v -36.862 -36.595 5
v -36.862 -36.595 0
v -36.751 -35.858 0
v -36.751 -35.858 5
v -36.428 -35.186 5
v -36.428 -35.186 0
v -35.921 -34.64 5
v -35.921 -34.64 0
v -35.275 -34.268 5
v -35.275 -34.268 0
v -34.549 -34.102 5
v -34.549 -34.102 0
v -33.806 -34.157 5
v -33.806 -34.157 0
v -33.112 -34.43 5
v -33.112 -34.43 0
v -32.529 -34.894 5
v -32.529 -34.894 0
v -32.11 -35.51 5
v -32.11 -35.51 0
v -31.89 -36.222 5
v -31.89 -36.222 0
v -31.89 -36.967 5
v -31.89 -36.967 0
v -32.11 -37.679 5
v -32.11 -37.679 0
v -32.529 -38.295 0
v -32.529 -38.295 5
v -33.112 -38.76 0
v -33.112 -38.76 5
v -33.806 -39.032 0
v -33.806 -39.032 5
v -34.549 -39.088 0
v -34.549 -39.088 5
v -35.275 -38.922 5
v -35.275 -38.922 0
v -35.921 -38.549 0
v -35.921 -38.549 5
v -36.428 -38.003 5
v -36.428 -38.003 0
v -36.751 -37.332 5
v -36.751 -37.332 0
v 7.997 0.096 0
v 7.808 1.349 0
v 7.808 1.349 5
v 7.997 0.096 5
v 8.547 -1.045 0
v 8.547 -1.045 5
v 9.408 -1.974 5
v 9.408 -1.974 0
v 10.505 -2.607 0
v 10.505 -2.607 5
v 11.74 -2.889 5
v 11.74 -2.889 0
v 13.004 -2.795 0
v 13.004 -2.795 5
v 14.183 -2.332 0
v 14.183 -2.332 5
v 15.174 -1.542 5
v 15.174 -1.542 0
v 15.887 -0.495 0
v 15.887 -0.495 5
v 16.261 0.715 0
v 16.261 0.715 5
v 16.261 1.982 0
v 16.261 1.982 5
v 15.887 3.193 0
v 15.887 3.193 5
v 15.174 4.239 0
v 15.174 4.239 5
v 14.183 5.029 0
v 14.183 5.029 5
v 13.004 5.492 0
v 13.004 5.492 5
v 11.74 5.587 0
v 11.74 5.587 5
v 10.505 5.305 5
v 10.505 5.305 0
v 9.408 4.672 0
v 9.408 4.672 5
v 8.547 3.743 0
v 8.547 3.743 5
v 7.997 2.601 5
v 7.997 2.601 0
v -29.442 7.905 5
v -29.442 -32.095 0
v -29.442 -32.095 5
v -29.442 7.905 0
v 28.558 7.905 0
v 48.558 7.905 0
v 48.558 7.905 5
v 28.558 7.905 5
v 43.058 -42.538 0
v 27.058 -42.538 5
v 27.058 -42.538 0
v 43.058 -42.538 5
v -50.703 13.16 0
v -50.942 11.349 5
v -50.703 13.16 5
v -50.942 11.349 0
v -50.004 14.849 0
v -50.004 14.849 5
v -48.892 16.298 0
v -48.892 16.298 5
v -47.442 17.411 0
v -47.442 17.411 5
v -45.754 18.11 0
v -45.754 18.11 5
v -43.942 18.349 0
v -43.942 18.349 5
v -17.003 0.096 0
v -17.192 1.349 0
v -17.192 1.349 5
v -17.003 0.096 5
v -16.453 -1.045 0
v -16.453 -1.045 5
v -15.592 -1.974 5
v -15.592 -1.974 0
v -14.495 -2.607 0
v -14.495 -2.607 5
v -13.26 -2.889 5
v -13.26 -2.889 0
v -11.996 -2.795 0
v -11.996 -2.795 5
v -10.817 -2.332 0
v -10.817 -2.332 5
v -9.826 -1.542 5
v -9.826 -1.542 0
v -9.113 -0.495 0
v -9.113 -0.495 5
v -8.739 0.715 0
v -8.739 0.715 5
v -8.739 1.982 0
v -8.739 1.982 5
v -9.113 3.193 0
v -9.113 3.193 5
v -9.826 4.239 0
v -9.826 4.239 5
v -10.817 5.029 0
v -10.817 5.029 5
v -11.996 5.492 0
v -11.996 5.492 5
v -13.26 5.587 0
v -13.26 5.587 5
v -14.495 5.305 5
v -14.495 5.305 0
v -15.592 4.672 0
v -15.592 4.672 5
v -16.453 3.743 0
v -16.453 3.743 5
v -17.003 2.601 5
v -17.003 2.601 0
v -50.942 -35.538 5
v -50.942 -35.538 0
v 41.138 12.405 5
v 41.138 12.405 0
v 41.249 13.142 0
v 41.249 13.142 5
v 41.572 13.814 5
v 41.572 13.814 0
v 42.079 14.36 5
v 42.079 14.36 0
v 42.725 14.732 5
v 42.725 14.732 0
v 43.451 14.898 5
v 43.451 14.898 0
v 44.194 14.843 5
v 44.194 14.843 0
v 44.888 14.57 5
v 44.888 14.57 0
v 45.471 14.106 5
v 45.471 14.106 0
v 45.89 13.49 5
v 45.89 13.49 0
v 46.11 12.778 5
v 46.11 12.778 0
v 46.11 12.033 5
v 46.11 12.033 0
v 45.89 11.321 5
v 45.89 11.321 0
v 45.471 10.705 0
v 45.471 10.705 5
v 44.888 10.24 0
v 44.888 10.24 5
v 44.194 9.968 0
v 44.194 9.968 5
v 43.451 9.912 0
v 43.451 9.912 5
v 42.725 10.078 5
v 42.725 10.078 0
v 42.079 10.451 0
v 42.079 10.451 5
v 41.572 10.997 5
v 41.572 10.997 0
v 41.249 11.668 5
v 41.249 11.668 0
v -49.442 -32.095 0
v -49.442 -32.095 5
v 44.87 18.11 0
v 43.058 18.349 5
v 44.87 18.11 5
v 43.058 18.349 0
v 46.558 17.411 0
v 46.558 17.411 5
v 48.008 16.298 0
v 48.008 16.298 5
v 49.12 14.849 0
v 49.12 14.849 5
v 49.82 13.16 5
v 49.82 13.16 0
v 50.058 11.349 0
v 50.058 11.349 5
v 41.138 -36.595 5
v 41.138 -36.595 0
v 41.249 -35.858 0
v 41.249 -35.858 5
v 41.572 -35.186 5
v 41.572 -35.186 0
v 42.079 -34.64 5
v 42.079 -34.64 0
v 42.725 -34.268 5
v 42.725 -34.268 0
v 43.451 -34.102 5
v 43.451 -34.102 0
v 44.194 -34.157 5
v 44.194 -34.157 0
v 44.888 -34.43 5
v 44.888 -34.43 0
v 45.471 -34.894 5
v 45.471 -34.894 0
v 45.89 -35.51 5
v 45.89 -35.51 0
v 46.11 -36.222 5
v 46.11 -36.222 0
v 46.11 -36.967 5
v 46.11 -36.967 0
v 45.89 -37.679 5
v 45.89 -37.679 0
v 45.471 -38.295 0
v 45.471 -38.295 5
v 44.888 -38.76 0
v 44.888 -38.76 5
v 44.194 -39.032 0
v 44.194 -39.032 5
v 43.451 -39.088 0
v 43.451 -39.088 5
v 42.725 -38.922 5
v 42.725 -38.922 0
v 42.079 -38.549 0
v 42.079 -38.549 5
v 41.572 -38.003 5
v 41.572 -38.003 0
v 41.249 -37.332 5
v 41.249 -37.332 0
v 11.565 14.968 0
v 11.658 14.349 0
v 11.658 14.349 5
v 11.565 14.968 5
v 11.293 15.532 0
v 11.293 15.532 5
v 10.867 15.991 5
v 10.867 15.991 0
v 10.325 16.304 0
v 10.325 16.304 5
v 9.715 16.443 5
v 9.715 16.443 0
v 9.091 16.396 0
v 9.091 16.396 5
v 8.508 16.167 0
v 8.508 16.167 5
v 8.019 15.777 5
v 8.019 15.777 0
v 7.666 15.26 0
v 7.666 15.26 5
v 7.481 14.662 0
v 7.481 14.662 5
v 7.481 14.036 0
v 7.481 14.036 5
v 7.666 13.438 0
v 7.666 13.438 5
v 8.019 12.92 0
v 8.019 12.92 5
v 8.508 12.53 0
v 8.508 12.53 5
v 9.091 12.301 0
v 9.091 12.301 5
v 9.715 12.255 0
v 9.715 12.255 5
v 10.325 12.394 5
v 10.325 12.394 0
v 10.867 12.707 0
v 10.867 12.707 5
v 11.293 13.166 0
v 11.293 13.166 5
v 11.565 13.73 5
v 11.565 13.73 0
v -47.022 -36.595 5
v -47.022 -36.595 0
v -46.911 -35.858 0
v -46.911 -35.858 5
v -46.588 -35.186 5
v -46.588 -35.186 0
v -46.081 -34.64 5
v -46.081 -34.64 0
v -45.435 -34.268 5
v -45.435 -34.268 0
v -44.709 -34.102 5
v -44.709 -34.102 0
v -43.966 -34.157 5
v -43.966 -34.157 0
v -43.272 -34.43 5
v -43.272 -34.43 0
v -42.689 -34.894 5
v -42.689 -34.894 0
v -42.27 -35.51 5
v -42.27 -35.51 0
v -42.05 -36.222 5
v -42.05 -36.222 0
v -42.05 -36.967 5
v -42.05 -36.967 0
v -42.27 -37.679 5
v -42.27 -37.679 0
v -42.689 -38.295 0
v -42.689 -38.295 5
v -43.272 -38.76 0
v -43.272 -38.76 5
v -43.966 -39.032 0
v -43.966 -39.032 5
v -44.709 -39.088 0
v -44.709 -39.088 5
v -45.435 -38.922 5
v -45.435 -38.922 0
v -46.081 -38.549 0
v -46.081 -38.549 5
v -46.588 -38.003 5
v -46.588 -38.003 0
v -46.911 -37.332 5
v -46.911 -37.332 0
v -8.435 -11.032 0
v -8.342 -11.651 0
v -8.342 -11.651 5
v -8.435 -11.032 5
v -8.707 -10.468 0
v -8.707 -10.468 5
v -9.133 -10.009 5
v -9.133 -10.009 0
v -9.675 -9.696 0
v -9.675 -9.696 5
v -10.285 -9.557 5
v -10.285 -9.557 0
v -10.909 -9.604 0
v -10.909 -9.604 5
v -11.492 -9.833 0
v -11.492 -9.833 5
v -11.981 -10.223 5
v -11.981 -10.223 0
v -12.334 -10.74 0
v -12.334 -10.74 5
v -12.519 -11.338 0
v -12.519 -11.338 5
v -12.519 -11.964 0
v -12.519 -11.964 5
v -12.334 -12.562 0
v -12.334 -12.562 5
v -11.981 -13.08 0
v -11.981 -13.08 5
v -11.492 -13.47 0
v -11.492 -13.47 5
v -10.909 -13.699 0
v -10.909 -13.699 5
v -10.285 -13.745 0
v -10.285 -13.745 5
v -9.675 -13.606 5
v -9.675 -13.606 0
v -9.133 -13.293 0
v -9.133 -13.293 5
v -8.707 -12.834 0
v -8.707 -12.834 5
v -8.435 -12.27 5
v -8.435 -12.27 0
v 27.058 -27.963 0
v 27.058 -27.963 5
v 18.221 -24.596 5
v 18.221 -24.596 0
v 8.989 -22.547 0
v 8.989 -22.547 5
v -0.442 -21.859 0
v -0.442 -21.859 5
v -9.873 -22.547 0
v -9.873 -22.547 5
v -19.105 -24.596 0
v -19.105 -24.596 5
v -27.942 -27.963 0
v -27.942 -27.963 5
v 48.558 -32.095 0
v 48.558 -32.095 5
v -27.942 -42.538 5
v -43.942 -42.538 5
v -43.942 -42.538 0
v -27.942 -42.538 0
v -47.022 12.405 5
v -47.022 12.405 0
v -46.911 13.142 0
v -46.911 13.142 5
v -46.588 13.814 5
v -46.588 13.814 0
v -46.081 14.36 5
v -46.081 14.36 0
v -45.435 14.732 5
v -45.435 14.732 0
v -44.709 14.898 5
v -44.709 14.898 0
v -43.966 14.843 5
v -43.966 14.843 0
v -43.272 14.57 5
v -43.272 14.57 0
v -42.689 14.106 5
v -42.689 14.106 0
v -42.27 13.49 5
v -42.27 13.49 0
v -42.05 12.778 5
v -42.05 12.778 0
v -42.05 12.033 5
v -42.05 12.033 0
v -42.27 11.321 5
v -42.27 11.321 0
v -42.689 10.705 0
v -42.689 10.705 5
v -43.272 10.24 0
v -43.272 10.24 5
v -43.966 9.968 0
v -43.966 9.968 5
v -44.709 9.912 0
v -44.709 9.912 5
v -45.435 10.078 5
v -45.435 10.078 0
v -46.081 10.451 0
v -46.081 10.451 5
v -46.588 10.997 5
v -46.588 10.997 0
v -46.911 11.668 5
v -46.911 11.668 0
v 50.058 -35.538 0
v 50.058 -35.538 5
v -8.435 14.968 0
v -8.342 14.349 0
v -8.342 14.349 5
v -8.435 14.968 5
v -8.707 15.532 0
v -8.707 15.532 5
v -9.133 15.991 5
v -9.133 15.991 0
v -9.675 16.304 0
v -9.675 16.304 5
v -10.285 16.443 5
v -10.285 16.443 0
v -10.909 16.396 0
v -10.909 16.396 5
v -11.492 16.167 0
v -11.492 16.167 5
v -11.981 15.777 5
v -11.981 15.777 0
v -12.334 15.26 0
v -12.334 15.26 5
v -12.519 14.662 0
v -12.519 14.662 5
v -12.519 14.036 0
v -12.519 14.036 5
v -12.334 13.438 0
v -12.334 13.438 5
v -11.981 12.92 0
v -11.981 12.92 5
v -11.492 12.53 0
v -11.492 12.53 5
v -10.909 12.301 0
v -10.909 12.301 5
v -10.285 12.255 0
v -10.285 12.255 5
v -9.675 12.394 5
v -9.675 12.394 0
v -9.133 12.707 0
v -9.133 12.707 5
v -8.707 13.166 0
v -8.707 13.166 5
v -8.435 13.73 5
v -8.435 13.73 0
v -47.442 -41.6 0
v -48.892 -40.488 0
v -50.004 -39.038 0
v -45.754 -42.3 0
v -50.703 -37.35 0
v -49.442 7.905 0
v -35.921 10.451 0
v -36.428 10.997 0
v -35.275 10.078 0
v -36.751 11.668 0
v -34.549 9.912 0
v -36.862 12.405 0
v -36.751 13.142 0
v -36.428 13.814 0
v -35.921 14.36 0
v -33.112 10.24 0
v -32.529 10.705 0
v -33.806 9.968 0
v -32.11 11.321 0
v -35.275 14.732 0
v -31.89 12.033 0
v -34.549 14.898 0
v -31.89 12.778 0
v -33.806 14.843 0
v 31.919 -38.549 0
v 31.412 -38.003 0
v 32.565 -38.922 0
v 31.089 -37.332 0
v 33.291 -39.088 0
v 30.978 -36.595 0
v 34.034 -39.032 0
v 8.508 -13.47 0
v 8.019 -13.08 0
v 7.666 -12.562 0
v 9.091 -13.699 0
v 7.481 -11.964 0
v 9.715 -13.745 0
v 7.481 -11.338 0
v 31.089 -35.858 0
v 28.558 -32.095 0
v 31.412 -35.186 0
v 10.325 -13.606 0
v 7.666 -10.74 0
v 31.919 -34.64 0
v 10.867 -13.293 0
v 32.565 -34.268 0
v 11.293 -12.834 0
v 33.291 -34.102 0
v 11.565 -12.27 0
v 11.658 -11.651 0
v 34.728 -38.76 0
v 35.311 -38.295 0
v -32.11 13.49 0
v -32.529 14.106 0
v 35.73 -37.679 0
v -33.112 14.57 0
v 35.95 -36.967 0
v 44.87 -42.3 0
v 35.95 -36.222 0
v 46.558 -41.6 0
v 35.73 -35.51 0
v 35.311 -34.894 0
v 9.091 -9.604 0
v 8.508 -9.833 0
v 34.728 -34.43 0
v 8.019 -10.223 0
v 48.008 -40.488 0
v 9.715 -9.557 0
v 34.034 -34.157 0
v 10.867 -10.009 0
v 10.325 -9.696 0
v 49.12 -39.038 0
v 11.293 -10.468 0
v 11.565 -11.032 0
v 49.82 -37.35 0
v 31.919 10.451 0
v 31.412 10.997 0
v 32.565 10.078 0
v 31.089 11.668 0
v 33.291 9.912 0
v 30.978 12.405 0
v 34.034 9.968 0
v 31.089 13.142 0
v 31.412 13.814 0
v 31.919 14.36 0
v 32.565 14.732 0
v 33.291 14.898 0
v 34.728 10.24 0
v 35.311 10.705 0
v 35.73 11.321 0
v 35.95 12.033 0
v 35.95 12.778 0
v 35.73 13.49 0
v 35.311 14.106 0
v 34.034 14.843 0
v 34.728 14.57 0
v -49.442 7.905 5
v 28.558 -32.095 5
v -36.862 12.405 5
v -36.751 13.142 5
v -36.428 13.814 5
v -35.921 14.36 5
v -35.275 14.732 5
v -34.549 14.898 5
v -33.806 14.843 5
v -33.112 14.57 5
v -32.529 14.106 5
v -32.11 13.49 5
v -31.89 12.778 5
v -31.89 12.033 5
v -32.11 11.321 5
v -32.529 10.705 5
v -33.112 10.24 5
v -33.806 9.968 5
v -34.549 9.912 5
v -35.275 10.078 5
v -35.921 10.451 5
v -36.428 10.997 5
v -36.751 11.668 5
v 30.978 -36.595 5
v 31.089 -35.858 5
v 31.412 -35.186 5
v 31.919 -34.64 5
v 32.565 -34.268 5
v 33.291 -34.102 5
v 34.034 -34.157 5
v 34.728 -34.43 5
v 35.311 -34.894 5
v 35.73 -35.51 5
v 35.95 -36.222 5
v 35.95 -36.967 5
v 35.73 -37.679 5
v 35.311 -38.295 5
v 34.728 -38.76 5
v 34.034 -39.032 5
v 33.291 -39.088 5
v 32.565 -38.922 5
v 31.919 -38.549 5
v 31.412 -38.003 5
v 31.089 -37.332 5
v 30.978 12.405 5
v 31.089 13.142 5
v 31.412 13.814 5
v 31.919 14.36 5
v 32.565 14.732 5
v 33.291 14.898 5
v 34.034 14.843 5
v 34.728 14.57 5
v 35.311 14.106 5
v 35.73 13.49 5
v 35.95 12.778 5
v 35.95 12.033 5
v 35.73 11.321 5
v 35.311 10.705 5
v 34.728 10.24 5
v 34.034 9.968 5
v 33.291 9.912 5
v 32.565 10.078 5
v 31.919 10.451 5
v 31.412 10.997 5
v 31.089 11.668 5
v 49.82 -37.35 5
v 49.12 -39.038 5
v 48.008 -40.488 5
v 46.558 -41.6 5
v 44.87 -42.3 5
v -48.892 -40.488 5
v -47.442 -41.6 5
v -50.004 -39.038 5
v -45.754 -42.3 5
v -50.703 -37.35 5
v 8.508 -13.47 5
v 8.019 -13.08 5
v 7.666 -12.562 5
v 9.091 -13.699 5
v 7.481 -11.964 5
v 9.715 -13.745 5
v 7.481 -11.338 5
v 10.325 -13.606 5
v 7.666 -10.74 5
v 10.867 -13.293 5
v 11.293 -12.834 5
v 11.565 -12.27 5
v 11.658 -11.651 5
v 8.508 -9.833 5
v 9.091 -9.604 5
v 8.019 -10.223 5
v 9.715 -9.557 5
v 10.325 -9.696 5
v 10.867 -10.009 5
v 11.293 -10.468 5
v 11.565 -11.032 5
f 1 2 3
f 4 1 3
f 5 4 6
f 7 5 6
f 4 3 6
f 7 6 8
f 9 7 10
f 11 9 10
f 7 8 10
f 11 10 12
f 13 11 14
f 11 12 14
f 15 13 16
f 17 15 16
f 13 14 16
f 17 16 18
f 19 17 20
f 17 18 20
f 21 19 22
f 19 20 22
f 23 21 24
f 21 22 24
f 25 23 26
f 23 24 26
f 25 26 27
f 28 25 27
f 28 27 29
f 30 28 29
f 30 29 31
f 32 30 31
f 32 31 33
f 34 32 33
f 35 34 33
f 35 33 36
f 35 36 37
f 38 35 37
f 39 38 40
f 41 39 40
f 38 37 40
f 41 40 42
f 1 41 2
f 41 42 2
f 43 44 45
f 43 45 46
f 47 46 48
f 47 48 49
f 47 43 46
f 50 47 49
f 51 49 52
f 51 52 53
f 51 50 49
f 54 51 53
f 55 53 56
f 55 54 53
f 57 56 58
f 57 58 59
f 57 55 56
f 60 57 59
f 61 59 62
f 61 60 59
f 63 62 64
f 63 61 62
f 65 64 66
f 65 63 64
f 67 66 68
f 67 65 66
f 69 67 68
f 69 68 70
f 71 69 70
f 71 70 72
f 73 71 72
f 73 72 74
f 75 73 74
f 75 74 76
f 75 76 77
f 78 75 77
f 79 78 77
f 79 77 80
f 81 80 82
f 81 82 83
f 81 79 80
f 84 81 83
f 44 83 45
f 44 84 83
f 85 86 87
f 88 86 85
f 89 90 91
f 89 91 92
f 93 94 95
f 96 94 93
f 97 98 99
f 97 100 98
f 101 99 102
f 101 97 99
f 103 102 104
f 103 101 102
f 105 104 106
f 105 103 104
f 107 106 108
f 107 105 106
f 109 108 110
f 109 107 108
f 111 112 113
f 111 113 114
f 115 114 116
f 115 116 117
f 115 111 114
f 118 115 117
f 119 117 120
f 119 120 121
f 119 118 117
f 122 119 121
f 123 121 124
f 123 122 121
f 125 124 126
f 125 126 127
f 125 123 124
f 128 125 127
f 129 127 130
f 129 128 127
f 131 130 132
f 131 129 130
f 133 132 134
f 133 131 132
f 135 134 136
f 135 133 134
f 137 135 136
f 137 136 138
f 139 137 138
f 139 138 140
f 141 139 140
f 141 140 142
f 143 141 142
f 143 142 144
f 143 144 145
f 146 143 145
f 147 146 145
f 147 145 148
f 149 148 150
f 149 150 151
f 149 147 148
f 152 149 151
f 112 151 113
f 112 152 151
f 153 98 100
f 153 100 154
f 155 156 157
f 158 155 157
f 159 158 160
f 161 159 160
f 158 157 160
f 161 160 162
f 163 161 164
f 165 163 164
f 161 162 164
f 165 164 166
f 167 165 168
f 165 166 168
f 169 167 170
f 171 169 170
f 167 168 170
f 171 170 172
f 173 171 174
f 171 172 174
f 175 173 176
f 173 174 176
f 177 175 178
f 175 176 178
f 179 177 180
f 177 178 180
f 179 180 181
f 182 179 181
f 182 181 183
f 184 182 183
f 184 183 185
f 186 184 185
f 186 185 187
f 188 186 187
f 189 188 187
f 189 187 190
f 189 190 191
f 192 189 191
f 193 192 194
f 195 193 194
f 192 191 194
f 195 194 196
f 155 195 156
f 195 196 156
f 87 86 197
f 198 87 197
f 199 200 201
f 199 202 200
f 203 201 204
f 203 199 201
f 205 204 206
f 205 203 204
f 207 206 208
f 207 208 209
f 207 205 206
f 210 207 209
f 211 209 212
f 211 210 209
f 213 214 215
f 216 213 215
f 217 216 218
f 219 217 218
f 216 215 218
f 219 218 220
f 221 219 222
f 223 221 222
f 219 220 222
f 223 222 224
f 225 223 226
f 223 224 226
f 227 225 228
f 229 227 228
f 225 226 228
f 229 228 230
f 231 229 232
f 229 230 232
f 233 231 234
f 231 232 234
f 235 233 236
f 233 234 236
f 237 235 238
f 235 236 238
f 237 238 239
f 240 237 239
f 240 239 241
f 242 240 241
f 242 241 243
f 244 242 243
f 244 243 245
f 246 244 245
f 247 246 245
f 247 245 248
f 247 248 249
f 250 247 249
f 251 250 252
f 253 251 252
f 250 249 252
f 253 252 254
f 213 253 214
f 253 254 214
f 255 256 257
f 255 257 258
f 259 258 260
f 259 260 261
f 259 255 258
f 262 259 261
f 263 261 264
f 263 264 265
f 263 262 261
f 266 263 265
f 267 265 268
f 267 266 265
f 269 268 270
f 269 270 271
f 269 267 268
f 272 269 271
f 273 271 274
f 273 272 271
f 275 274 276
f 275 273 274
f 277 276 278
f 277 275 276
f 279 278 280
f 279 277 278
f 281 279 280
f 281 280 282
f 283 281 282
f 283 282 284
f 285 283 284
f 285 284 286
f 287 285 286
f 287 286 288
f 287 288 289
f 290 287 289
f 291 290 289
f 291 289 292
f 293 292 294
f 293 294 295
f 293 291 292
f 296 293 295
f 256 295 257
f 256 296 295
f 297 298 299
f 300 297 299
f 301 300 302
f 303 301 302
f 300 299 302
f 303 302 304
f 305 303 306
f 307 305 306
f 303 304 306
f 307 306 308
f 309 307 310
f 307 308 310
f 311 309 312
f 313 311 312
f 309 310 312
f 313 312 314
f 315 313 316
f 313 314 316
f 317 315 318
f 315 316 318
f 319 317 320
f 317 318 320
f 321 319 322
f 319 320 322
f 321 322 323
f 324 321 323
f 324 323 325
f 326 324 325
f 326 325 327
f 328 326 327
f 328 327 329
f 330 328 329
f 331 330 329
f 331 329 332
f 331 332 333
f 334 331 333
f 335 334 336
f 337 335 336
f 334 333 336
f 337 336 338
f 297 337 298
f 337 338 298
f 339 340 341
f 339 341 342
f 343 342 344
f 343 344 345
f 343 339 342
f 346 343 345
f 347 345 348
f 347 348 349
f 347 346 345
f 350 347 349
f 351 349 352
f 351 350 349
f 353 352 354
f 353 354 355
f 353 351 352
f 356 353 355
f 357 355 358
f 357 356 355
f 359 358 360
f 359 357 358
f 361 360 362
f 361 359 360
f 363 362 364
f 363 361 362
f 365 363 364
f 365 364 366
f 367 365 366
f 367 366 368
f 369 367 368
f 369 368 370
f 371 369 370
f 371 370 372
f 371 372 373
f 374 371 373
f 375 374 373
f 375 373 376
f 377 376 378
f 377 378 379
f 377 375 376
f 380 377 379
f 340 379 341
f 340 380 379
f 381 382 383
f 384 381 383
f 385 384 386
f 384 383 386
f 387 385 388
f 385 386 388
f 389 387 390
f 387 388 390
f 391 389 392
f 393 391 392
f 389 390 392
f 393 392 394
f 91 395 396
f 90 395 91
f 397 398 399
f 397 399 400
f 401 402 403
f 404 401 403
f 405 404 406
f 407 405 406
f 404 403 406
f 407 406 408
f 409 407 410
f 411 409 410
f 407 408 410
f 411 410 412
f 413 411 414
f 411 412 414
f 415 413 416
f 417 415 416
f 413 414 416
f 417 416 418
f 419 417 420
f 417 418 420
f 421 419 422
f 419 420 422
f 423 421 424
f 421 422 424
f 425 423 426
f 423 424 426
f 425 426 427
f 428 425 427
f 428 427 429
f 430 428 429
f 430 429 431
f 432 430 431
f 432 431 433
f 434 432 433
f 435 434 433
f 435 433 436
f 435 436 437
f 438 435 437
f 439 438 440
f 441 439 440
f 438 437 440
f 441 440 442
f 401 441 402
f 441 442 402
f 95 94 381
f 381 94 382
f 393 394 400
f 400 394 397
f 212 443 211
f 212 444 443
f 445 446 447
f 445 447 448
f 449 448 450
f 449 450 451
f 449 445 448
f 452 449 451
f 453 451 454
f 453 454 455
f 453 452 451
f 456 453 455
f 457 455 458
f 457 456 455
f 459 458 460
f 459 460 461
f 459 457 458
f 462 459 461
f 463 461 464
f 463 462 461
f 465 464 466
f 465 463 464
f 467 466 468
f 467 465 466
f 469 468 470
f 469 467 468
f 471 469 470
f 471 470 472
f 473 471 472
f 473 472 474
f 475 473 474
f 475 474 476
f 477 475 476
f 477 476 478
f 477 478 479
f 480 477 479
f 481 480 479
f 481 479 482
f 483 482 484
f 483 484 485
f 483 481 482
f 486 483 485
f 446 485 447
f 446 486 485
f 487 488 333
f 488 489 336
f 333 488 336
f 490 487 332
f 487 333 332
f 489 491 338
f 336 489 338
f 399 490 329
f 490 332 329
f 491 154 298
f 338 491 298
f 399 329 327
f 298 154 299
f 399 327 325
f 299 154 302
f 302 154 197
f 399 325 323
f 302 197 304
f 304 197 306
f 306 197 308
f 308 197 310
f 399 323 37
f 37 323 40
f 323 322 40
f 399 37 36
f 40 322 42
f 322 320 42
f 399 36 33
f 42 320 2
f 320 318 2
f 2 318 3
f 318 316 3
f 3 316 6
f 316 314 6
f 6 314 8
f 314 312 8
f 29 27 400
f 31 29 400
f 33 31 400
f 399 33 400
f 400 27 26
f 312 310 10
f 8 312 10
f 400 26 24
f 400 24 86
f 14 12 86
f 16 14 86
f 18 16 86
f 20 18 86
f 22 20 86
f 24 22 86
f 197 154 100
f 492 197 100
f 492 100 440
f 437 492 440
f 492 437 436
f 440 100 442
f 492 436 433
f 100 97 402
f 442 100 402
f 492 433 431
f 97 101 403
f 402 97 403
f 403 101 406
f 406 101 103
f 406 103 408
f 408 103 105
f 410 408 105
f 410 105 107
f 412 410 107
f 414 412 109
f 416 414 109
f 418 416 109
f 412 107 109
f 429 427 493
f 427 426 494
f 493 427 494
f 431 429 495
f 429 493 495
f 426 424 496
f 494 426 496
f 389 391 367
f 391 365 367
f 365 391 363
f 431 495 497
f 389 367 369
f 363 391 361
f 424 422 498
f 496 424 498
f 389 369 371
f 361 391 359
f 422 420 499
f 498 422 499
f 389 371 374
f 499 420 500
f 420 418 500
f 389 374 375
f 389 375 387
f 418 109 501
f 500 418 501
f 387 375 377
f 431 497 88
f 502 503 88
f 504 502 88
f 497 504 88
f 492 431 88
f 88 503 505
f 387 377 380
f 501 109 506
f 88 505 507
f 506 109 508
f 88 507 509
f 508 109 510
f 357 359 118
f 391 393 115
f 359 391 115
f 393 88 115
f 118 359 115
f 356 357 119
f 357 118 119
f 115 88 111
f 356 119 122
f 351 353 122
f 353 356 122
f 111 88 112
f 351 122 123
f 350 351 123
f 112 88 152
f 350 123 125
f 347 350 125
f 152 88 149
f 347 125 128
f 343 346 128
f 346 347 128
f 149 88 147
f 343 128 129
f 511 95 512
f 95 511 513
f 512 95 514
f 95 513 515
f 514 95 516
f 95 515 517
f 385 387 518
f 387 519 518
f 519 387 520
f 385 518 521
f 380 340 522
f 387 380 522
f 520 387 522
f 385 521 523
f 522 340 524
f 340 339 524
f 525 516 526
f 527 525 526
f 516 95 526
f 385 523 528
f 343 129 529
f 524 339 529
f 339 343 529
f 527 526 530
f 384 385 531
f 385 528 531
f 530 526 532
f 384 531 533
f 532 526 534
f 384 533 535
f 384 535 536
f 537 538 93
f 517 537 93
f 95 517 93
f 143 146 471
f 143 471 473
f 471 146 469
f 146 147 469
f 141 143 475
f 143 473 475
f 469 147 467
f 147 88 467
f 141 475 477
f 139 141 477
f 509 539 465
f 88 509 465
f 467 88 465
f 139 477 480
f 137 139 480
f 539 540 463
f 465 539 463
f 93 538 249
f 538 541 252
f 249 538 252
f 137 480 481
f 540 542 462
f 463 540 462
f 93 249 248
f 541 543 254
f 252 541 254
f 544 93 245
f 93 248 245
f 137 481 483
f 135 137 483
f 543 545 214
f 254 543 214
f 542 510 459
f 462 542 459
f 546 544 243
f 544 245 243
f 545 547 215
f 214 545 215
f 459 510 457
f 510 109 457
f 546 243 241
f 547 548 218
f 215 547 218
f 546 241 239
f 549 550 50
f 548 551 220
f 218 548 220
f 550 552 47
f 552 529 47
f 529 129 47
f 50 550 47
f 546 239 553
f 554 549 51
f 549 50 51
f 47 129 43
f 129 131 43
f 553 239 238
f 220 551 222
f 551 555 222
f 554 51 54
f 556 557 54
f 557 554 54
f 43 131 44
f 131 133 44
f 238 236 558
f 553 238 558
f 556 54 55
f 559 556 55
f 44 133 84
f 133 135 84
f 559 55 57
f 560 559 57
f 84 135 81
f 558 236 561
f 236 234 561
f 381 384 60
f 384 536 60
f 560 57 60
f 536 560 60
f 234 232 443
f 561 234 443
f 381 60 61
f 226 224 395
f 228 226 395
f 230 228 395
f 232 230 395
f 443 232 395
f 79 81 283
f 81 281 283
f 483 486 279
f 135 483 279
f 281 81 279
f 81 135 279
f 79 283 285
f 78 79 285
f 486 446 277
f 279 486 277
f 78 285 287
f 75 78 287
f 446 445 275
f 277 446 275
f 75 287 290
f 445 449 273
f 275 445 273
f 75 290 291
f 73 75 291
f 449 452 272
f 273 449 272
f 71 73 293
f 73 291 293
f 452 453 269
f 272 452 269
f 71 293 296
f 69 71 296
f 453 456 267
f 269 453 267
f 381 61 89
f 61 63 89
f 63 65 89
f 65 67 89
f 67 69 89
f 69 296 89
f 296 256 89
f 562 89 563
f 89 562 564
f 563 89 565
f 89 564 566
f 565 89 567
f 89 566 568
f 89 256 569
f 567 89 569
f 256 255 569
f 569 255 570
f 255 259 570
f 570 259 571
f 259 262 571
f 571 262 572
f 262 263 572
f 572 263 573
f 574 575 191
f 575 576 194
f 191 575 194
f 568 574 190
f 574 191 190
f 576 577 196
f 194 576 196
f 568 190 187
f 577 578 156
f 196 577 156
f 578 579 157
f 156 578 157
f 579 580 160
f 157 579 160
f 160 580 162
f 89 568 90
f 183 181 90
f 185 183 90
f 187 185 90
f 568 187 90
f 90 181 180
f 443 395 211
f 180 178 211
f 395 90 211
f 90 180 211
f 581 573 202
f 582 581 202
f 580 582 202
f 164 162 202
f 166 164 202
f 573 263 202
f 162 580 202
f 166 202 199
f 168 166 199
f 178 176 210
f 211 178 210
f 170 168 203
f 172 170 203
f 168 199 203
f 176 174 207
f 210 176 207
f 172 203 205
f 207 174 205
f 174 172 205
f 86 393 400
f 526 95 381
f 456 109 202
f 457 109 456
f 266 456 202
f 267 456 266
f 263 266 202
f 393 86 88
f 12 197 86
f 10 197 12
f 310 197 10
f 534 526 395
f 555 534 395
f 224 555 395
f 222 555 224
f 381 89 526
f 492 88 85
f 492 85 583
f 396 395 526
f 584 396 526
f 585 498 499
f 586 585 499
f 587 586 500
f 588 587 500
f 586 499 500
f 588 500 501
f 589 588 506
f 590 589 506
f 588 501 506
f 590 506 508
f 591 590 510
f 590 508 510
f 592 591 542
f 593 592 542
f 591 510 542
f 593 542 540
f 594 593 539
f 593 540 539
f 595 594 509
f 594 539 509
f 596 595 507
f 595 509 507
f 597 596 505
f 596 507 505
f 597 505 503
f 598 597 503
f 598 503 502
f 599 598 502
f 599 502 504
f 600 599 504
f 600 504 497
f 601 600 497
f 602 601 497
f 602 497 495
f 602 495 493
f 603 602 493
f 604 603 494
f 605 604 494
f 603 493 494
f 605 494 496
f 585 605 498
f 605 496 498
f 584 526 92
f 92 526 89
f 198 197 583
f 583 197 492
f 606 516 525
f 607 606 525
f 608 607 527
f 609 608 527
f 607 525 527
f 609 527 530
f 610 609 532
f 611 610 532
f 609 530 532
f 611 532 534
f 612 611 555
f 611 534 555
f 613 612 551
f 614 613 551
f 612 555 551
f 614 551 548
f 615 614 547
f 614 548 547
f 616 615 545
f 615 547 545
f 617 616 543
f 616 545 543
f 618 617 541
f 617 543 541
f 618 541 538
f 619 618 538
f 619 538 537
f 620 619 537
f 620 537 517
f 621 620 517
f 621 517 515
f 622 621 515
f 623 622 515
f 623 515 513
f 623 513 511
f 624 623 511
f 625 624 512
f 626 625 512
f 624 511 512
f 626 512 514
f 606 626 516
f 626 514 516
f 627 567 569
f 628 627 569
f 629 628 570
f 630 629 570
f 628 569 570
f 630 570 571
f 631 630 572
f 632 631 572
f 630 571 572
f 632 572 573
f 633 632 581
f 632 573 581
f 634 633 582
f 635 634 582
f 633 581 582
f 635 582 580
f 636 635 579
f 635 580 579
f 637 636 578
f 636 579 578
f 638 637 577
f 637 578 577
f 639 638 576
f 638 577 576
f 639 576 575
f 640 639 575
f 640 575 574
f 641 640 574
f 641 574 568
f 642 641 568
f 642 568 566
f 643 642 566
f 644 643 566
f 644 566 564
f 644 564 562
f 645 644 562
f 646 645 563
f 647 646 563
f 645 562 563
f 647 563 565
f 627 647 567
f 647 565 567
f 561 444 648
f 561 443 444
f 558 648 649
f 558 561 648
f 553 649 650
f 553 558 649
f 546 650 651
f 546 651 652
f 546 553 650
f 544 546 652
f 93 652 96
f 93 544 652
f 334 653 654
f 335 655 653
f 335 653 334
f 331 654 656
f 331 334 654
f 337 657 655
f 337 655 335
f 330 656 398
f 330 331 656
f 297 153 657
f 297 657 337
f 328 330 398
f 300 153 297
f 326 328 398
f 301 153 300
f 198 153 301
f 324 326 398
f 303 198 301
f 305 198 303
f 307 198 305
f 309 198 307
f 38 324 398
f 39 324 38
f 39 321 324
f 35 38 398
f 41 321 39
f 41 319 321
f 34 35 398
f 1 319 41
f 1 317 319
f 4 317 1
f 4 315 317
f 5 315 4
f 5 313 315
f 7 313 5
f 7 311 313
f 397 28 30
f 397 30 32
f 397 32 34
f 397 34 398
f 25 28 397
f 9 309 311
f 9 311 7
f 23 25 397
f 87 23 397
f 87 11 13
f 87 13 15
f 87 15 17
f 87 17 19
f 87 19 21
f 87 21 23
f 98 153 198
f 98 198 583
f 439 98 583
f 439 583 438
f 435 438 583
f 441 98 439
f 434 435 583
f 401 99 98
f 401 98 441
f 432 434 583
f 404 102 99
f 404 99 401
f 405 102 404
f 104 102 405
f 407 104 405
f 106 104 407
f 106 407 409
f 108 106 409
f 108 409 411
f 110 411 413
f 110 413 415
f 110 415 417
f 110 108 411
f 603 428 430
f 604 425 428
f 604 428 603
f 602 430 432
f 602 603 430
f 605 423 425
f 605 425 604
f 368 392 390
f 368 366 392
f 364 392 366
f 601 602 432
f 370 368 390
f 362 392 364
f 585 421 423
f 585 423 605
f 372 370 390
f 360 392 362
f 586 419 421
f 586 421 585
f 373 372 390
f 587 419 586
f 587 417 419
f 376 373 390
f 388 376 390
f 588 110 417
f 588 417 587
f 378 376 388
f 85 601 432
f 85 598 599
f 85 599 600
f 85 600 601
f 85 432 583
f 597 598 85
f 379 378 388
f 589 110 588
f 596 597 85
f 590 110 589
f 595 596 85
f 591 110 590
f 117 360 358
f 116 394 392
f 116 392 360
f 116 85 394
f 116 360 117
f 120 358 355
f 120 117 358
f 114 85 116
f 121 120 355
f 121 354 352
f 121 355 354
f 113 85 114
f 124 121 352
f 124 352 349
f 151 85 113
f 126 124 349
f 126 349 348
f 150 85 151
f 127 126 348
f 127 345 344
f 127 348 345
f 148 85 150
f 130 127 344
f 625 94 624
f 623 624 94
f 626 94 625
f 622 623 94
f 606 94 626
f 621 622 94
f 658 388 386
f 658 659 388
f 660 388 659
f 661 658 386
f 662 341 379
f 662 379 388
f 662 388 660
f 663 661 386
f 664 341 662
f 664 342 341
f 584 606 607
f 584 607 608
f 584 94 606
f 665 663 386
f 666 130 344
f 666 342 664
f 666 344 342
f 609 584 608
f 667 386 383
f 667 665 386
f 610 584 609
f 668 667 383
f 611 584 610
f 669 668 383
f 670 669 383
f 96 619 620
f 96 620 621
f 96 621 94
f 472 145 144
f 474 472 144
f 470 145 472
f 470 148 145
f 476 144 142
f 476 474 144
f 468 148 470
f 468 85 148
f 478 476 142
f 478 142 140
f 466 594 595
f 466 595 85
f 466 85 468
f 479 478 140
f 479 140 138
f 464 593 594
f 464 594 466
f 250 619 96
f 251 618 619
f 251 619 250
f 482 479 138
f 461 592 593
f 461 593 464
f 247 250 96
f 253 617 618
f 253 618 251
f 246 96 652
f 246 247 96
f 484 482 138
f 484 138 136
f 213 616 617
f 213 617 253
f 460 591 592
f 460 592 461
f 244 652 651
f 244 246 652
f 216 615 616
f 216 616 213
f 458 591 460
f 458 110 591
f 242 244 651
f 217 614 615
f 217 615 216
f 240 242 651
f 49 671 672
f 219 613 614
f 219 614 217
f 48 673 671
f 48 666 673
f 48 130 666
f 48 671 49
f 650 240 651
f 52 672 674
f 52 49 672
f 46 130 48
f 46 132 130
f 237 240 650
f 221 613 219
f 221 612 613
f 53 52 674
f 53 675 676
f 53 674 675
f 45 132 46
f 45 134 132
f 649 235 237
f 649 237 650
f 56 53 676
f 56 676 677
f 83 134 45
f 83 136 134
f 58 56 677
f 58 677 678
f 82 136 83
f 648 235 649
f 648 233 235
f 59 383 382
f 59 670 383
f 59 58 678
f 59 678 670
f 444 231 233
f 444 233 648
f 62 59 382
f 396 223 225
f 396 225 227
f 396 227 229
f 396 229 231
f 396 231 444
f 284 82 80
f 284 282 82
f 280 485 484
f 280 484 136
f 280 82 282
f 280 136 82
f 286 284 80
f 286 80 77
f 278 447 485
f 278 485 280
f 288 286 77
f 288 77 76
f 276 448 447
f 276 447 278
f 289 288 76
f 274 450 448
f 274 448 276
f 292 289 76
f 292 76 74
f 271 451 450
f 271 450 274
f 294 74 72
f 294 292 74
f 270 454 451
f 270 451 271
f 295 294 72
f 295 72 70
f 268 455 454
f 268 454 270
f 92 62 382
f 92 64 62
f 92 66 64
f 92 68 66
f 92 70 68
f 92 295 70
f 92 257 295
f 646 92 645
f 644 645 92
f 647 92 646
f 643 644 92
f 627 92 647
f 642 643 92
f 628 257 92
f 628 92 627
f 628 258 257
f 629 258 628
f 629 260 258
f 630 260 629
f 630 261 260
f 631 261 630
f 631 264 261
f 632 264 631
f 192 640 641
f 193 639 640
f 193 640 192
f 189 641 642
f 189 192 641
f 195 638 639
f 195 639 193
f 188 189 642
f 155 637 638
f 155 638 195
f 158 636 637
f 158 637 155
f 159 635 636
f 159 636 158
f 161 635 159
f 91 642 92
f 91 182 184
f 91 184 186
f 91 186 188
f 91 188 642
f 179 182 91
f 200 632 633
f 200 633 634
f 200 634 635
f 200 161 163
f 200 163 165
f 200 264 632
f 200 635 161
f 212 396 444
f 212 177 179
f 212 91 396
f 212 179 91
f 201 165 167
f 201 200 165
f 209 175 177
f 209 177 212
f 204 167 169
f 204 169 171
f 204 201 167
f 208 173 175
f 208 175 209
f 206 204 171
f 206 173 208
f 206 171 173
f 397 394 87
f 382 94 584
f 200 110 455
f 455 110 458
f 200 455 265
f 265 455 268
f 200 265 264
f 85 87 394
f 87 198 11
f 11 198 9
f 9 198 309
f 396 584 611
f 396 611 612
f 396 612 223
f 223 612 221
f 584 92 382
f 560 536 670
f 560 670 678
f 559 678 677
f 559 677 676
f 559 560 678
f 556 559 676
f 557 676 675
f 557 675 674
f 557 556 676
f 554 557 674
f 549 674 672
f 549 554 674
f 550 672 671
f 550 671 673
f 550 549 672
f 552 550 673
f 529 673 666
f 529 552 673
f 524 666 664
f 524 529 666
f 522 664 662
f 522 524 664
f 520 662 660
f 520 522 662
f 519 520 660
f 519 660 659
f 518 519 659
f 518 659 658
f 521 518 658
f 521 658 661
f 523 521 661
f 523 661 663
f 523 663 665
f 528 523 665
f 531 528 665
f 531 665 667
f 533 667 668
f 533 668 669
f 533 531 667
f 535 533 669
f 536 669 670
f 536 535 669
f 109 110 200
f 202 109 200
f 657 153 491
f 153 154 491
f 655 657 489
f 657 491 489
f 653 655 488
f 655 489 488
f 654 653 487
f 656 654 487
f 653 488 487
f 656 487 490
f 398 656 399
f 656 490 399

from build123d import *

# Parameters (mm, degrees)
SKETCH1_R           = 2.1
BOSS_EXTRUDE1_DEPTH = 5
CUT_EXTRUDE1_DEPTH  = 5
SKETCH3_W           = 38.251438616
SKETCH3_H           = 32.766065525
CUT_EXTRUDE2_DEPTH  = 10
BOSS_EXTRUDE2_DEPTH = 5
SKETCH5_W           = 101.856885825
SKETCH5_H           = 15.226385752
CUT_EXTRUDE3_DEPTH  = 10
BOSS_EXTRUDE3_DEPTH = 5
CUT_EXTRUDE4_DEPTH  = 5
SKETCH8_R           = 2.5
SKETCH8_W           = 20
SKETCH8_H           = 40
CUT_EXTRUDE5_DEPTH  = 5
FILLET2_R           = 7


with BuildPart() as part:
    # Sketch1 → Boss-Extrude1 (new body)
    with BuildSketch(Plane.XY):
        Polygon((27.058043777, 13.348752177), (18.058043777, 13.348752177), (18.058043777, 18.348752177), (-18.941956223, 18.348752177), (-18.941956223, 13.348752177), (-27.941956223, 13.348752177), (-27.941956223, 1.348752177), (-27.941956223, -10.651247823), (-63.297295282, -46.006586882), (-51.297295282, -58.006586882), (50.413382836, -58.006586882), (62.413382836, -46.006586882), (27.058043777, -10.651247823), (27.058043777, 1.348752177), align=None)
        with Locations((9.558043777, -11.651247823)):
            Circle(SKETCH1_R, mode=Mode.SUBTRACT)
        with Locations((-10.441956223, -11.651247823)):
            Circle(SKETCH1_R, mode=Mode.SUBTRACT)
        with Locations((-10.441956223, 14.348752177)):
            Circle(SKETCH1_R, mode=Mode.SUBTRACT)
        with Locations((9.558043777, 14.348752177)):
            Circle(SKETCH1_R, mode=Mode.SUBTRACT)
        with BuildLine():
            ThreePointArc((-8.691956223, 1.348752177), (-12.941956223, 5.598752177), (-17.191956223, 1.348752177))
            ThreePointArc((-17.191956223, 1.348752177), (-12.941956223, -2.901247823), (-8.691956223, 1.348752177))
        make_face(mode=Mode.SUBTRACT)
        with BuildLine():
            ThreePointArc((16.308043777, 1.348752177), (12.058043777, 5.598752177), (7.808043777, 1.348752177))
            ThreePointArc((7.808043777, 1.348752177), (12.058043777, -2.901247823), (16.308043777, 1.348752177))
        make_face(mode=Mode.SUBTRACT)
    extrude(amount=BOSS_EXTRUDE1_DEPTH)

    # Sketch2 → Cut-Extrude1 (cut)
    with BuildSketch(Plane(origin=(0, 0, 0), x_dir=(-1, 0, 0), z_dir=(0, 0, -1))):
        with BuildLine():
            Line((-27.058043777, -22.48694002), (-27.058043777, -151.230871916))
            ThreePointArc((-27.058043777, -151.230871916), (0.441956223, -156.858905968), (27.941956223, -151.230871916))
            Line((27.941956223, -151.230871916), (27.941956223, -22.48694002))
            ThreePointArc((27.941956223, -22.48694002), (0.441956223, -16.858905968), (-27.058043777, -22.48694002))
        make_face()
    extrude(amount=-CUT_EXTRUDE1_DEPTH, mode=Mode.SUBTRACT)

    # Sketch3 → Cut-Extrude2 (cut)
    with BuildSketch(Plane(origin=(0, 0, 0), x_dir=(-1, 0, 0), z_dir=(0, 0, -1))):
        with Locations((-46.183763085, -43.921177391)):
            Rectangle(SKETCH3_W, SKETCH3_H)
        with Locations((47.067675531, -43.921177391)):
            Rectangle(SKETCH3_W, SKETCH3_H)
    extrude(amount=-CUT_EXTRUDE2_DEPTH, mode=Mode.SUBTRACT)

    # Sketch4 → Boss-Extrude2 (add)
    with BuildSketch(Plane(origin=(0, 0, 0), x_dir=(-1, 0, 0), z_dir=(0, 0, -1))):
        with BuildLine():
            Line((27.941956223, -10.651247823), (44.828853028, -27.538144628))
            Line((44.828853028, -27.538144628), (50.941956223, -27.538144628))
            Line((50.941956223, -27.538144628), (50.941956223, 27.461855372))
            ThreePointArc((50.941956223, 27.461855372), (49.477490129, 30.997389278), (45.941956223, 32.461855372))
            Line((45.941956223, 32.461855372), (-45.058043777, 32.461855372))
            ThreePointArc((-45.058043777, 32.461855372), (-48.593577683, 30.997389278), (-50.058043777, 27.461855372))
            Line((-50.058043777, 27.461855372), (-50.058043777, -27.538144628))
            Line((-50.058043777, -27.538144628), (-43.944940582, -27.538144628))
            Line((-43.944940582, -27.538144628), (-27.058043777, -10.651247823))
            Line((-27.058043777, -10.651247823), (-27.058043777, 13.348752177))
            Line((-27.058043777, 13.348752177), (-18.058043777, 13.348752177))
            Line((-18.058043777, 13.348752177), (-18.058043777, 18.348752177))
            Line((-18.058043777, 18.348752177), (18.941956223, 18.348752177))
            Line((18.941956223, 18.348752177), (18.941956223, 13.348752177))
            Line((18.941956223, 13.348752177), (27.941956223, 13.348752177))
            Line((27.941956223, 13.348752177), (27.941956223, -10.651247823))
        make_face()
    extrude(amount=-BOSS_EXTRUDE2_DEPTH)

    # Sketch5 → Cut-Extrude3 (cut)
    with BuildSketch(Plane.XY.offset(5)):
        with Locations((-0.013513311, 25.961945053)):
            Rectangle(SKETCH5_W, SKETCH5_H)
    extrude(amount=-CUT_EXTRUDE3_DEPTH, mode=Mode.SUBTRACT)

    # Sketch6 → Boss-Extrude3 (add)
    with BuildSketch(Plane.XY.offset(5)):
        with BuildLine():
            Line((50.058043777, -27.538144628), (27.058043777, -27.538144628))
            Line((27.058043777, -27.538144628), (27.058043777, -22.48694002))
            ThreePointArc((27.058043777, -22.48694002), (-0.441956223, -16.858905968), (-27.941956223, -22.48694002))
            Line((-27.941956223, -22.48694002), (-27.941956223, -27.538144628))
            Line((-27.941956223, -27.538144628), (-50.941956223, -27.538144628))
            Line((-50.941956223, -27.538144628), (-50.941956223, -42.538144628))
            Line((-50.941956223, -42.538144628), (-12.941956223, -42.538144628))
            Line((-12.941956223, -42.538144628), (12.058043777, -42.538144628))
            Line((12.058043777, -42.538144628), (50.058043777, -42.538144628))
            Line((50.058043777, -42.538144628), (50.058043777, -27.538144628))
        make_face()
    extrude(amount=-BOSS_EXTRUDE3_DEPTH)

    # Sketch7 → Cut-Extrude4 (cut)
    with BuildSketch(Plane.XY.offset(5)):
        with BuildLine():
            Line((-27.941956223, -27.962811021), (-27.941956223, -42.538144628))
            Line((-27.941956223, -42.538144628), (27.058043777, -42.538144628))
            Line((27.058043777, -42.538144628), (27.058043777, -27.962811021))
            ThreePointArc((27.058043777, -27.962811021), (-0.441956223, -21.858905968), (-27.941956223, -27.962811021))
        make_face()
    extrude(amount=-CUT_EXTRUDE4_DEPTH, mode=Mode.SUBTRACT)

    # Sketch8 → Cut-Extrude5 (cut)
    with BuildSketch(Plane(origin=(0, 0, 0), x_dir=(-1, 0, 0), z_dir=(0, 0, -1))):
        with Locations((44.521956223, 12.405303775)):
            Circle(SKETCH8_R)
        with Locations((34.361956223, 12.405303775)):
            Circle(SKETCH8_R)
        with Locations((34.361956223, -36.594696225)):
            Circle(SKETCH8_R)
        with Locations((44.521956223, -36.594696225)):
            Circle(SKETCH8_R)
        with Locations((-43.638043777, -36.594696225)):
            Circle(SKETCH8_R)
        with Locations((-33.478043777, -36.594696225)):
            Circle(SKETCH8_R)
        with Locations((-33.478043777, 12.405303775)):
            Circle(SKETCH8_R)
        with Locations((-43.638043777, 12.405303775)):
            Circle(SKETCH8_R)
        with Locations((39.441956223, -12.094696225)):
            Rectangle(SKETCH8_W, SKETCH8_H)
        with Locations((-38.558043777, -12.094696225)):
            Rectangle(SKETCH8_W, SKETCH8_H)
    extrude(amount=-CUT_EXTRUDE5_DEPTH, mode=Mode.SUBTRACT)

    # Fillet2
    fillet2_edges = [part.edges().sort_by_distance(p)[0] for p in [
        (50.058043777, 18.348752177, 2.5),
        (-50.941956223, 18.348752177, 2.5),
        (50.058043777, -42.538144628, 2.5),
        (-50.941956223, -42.538144628, 2.5),
    ]]
    fillet(fillet2_edges, radius=FILLET2_R)


solid = part.part
